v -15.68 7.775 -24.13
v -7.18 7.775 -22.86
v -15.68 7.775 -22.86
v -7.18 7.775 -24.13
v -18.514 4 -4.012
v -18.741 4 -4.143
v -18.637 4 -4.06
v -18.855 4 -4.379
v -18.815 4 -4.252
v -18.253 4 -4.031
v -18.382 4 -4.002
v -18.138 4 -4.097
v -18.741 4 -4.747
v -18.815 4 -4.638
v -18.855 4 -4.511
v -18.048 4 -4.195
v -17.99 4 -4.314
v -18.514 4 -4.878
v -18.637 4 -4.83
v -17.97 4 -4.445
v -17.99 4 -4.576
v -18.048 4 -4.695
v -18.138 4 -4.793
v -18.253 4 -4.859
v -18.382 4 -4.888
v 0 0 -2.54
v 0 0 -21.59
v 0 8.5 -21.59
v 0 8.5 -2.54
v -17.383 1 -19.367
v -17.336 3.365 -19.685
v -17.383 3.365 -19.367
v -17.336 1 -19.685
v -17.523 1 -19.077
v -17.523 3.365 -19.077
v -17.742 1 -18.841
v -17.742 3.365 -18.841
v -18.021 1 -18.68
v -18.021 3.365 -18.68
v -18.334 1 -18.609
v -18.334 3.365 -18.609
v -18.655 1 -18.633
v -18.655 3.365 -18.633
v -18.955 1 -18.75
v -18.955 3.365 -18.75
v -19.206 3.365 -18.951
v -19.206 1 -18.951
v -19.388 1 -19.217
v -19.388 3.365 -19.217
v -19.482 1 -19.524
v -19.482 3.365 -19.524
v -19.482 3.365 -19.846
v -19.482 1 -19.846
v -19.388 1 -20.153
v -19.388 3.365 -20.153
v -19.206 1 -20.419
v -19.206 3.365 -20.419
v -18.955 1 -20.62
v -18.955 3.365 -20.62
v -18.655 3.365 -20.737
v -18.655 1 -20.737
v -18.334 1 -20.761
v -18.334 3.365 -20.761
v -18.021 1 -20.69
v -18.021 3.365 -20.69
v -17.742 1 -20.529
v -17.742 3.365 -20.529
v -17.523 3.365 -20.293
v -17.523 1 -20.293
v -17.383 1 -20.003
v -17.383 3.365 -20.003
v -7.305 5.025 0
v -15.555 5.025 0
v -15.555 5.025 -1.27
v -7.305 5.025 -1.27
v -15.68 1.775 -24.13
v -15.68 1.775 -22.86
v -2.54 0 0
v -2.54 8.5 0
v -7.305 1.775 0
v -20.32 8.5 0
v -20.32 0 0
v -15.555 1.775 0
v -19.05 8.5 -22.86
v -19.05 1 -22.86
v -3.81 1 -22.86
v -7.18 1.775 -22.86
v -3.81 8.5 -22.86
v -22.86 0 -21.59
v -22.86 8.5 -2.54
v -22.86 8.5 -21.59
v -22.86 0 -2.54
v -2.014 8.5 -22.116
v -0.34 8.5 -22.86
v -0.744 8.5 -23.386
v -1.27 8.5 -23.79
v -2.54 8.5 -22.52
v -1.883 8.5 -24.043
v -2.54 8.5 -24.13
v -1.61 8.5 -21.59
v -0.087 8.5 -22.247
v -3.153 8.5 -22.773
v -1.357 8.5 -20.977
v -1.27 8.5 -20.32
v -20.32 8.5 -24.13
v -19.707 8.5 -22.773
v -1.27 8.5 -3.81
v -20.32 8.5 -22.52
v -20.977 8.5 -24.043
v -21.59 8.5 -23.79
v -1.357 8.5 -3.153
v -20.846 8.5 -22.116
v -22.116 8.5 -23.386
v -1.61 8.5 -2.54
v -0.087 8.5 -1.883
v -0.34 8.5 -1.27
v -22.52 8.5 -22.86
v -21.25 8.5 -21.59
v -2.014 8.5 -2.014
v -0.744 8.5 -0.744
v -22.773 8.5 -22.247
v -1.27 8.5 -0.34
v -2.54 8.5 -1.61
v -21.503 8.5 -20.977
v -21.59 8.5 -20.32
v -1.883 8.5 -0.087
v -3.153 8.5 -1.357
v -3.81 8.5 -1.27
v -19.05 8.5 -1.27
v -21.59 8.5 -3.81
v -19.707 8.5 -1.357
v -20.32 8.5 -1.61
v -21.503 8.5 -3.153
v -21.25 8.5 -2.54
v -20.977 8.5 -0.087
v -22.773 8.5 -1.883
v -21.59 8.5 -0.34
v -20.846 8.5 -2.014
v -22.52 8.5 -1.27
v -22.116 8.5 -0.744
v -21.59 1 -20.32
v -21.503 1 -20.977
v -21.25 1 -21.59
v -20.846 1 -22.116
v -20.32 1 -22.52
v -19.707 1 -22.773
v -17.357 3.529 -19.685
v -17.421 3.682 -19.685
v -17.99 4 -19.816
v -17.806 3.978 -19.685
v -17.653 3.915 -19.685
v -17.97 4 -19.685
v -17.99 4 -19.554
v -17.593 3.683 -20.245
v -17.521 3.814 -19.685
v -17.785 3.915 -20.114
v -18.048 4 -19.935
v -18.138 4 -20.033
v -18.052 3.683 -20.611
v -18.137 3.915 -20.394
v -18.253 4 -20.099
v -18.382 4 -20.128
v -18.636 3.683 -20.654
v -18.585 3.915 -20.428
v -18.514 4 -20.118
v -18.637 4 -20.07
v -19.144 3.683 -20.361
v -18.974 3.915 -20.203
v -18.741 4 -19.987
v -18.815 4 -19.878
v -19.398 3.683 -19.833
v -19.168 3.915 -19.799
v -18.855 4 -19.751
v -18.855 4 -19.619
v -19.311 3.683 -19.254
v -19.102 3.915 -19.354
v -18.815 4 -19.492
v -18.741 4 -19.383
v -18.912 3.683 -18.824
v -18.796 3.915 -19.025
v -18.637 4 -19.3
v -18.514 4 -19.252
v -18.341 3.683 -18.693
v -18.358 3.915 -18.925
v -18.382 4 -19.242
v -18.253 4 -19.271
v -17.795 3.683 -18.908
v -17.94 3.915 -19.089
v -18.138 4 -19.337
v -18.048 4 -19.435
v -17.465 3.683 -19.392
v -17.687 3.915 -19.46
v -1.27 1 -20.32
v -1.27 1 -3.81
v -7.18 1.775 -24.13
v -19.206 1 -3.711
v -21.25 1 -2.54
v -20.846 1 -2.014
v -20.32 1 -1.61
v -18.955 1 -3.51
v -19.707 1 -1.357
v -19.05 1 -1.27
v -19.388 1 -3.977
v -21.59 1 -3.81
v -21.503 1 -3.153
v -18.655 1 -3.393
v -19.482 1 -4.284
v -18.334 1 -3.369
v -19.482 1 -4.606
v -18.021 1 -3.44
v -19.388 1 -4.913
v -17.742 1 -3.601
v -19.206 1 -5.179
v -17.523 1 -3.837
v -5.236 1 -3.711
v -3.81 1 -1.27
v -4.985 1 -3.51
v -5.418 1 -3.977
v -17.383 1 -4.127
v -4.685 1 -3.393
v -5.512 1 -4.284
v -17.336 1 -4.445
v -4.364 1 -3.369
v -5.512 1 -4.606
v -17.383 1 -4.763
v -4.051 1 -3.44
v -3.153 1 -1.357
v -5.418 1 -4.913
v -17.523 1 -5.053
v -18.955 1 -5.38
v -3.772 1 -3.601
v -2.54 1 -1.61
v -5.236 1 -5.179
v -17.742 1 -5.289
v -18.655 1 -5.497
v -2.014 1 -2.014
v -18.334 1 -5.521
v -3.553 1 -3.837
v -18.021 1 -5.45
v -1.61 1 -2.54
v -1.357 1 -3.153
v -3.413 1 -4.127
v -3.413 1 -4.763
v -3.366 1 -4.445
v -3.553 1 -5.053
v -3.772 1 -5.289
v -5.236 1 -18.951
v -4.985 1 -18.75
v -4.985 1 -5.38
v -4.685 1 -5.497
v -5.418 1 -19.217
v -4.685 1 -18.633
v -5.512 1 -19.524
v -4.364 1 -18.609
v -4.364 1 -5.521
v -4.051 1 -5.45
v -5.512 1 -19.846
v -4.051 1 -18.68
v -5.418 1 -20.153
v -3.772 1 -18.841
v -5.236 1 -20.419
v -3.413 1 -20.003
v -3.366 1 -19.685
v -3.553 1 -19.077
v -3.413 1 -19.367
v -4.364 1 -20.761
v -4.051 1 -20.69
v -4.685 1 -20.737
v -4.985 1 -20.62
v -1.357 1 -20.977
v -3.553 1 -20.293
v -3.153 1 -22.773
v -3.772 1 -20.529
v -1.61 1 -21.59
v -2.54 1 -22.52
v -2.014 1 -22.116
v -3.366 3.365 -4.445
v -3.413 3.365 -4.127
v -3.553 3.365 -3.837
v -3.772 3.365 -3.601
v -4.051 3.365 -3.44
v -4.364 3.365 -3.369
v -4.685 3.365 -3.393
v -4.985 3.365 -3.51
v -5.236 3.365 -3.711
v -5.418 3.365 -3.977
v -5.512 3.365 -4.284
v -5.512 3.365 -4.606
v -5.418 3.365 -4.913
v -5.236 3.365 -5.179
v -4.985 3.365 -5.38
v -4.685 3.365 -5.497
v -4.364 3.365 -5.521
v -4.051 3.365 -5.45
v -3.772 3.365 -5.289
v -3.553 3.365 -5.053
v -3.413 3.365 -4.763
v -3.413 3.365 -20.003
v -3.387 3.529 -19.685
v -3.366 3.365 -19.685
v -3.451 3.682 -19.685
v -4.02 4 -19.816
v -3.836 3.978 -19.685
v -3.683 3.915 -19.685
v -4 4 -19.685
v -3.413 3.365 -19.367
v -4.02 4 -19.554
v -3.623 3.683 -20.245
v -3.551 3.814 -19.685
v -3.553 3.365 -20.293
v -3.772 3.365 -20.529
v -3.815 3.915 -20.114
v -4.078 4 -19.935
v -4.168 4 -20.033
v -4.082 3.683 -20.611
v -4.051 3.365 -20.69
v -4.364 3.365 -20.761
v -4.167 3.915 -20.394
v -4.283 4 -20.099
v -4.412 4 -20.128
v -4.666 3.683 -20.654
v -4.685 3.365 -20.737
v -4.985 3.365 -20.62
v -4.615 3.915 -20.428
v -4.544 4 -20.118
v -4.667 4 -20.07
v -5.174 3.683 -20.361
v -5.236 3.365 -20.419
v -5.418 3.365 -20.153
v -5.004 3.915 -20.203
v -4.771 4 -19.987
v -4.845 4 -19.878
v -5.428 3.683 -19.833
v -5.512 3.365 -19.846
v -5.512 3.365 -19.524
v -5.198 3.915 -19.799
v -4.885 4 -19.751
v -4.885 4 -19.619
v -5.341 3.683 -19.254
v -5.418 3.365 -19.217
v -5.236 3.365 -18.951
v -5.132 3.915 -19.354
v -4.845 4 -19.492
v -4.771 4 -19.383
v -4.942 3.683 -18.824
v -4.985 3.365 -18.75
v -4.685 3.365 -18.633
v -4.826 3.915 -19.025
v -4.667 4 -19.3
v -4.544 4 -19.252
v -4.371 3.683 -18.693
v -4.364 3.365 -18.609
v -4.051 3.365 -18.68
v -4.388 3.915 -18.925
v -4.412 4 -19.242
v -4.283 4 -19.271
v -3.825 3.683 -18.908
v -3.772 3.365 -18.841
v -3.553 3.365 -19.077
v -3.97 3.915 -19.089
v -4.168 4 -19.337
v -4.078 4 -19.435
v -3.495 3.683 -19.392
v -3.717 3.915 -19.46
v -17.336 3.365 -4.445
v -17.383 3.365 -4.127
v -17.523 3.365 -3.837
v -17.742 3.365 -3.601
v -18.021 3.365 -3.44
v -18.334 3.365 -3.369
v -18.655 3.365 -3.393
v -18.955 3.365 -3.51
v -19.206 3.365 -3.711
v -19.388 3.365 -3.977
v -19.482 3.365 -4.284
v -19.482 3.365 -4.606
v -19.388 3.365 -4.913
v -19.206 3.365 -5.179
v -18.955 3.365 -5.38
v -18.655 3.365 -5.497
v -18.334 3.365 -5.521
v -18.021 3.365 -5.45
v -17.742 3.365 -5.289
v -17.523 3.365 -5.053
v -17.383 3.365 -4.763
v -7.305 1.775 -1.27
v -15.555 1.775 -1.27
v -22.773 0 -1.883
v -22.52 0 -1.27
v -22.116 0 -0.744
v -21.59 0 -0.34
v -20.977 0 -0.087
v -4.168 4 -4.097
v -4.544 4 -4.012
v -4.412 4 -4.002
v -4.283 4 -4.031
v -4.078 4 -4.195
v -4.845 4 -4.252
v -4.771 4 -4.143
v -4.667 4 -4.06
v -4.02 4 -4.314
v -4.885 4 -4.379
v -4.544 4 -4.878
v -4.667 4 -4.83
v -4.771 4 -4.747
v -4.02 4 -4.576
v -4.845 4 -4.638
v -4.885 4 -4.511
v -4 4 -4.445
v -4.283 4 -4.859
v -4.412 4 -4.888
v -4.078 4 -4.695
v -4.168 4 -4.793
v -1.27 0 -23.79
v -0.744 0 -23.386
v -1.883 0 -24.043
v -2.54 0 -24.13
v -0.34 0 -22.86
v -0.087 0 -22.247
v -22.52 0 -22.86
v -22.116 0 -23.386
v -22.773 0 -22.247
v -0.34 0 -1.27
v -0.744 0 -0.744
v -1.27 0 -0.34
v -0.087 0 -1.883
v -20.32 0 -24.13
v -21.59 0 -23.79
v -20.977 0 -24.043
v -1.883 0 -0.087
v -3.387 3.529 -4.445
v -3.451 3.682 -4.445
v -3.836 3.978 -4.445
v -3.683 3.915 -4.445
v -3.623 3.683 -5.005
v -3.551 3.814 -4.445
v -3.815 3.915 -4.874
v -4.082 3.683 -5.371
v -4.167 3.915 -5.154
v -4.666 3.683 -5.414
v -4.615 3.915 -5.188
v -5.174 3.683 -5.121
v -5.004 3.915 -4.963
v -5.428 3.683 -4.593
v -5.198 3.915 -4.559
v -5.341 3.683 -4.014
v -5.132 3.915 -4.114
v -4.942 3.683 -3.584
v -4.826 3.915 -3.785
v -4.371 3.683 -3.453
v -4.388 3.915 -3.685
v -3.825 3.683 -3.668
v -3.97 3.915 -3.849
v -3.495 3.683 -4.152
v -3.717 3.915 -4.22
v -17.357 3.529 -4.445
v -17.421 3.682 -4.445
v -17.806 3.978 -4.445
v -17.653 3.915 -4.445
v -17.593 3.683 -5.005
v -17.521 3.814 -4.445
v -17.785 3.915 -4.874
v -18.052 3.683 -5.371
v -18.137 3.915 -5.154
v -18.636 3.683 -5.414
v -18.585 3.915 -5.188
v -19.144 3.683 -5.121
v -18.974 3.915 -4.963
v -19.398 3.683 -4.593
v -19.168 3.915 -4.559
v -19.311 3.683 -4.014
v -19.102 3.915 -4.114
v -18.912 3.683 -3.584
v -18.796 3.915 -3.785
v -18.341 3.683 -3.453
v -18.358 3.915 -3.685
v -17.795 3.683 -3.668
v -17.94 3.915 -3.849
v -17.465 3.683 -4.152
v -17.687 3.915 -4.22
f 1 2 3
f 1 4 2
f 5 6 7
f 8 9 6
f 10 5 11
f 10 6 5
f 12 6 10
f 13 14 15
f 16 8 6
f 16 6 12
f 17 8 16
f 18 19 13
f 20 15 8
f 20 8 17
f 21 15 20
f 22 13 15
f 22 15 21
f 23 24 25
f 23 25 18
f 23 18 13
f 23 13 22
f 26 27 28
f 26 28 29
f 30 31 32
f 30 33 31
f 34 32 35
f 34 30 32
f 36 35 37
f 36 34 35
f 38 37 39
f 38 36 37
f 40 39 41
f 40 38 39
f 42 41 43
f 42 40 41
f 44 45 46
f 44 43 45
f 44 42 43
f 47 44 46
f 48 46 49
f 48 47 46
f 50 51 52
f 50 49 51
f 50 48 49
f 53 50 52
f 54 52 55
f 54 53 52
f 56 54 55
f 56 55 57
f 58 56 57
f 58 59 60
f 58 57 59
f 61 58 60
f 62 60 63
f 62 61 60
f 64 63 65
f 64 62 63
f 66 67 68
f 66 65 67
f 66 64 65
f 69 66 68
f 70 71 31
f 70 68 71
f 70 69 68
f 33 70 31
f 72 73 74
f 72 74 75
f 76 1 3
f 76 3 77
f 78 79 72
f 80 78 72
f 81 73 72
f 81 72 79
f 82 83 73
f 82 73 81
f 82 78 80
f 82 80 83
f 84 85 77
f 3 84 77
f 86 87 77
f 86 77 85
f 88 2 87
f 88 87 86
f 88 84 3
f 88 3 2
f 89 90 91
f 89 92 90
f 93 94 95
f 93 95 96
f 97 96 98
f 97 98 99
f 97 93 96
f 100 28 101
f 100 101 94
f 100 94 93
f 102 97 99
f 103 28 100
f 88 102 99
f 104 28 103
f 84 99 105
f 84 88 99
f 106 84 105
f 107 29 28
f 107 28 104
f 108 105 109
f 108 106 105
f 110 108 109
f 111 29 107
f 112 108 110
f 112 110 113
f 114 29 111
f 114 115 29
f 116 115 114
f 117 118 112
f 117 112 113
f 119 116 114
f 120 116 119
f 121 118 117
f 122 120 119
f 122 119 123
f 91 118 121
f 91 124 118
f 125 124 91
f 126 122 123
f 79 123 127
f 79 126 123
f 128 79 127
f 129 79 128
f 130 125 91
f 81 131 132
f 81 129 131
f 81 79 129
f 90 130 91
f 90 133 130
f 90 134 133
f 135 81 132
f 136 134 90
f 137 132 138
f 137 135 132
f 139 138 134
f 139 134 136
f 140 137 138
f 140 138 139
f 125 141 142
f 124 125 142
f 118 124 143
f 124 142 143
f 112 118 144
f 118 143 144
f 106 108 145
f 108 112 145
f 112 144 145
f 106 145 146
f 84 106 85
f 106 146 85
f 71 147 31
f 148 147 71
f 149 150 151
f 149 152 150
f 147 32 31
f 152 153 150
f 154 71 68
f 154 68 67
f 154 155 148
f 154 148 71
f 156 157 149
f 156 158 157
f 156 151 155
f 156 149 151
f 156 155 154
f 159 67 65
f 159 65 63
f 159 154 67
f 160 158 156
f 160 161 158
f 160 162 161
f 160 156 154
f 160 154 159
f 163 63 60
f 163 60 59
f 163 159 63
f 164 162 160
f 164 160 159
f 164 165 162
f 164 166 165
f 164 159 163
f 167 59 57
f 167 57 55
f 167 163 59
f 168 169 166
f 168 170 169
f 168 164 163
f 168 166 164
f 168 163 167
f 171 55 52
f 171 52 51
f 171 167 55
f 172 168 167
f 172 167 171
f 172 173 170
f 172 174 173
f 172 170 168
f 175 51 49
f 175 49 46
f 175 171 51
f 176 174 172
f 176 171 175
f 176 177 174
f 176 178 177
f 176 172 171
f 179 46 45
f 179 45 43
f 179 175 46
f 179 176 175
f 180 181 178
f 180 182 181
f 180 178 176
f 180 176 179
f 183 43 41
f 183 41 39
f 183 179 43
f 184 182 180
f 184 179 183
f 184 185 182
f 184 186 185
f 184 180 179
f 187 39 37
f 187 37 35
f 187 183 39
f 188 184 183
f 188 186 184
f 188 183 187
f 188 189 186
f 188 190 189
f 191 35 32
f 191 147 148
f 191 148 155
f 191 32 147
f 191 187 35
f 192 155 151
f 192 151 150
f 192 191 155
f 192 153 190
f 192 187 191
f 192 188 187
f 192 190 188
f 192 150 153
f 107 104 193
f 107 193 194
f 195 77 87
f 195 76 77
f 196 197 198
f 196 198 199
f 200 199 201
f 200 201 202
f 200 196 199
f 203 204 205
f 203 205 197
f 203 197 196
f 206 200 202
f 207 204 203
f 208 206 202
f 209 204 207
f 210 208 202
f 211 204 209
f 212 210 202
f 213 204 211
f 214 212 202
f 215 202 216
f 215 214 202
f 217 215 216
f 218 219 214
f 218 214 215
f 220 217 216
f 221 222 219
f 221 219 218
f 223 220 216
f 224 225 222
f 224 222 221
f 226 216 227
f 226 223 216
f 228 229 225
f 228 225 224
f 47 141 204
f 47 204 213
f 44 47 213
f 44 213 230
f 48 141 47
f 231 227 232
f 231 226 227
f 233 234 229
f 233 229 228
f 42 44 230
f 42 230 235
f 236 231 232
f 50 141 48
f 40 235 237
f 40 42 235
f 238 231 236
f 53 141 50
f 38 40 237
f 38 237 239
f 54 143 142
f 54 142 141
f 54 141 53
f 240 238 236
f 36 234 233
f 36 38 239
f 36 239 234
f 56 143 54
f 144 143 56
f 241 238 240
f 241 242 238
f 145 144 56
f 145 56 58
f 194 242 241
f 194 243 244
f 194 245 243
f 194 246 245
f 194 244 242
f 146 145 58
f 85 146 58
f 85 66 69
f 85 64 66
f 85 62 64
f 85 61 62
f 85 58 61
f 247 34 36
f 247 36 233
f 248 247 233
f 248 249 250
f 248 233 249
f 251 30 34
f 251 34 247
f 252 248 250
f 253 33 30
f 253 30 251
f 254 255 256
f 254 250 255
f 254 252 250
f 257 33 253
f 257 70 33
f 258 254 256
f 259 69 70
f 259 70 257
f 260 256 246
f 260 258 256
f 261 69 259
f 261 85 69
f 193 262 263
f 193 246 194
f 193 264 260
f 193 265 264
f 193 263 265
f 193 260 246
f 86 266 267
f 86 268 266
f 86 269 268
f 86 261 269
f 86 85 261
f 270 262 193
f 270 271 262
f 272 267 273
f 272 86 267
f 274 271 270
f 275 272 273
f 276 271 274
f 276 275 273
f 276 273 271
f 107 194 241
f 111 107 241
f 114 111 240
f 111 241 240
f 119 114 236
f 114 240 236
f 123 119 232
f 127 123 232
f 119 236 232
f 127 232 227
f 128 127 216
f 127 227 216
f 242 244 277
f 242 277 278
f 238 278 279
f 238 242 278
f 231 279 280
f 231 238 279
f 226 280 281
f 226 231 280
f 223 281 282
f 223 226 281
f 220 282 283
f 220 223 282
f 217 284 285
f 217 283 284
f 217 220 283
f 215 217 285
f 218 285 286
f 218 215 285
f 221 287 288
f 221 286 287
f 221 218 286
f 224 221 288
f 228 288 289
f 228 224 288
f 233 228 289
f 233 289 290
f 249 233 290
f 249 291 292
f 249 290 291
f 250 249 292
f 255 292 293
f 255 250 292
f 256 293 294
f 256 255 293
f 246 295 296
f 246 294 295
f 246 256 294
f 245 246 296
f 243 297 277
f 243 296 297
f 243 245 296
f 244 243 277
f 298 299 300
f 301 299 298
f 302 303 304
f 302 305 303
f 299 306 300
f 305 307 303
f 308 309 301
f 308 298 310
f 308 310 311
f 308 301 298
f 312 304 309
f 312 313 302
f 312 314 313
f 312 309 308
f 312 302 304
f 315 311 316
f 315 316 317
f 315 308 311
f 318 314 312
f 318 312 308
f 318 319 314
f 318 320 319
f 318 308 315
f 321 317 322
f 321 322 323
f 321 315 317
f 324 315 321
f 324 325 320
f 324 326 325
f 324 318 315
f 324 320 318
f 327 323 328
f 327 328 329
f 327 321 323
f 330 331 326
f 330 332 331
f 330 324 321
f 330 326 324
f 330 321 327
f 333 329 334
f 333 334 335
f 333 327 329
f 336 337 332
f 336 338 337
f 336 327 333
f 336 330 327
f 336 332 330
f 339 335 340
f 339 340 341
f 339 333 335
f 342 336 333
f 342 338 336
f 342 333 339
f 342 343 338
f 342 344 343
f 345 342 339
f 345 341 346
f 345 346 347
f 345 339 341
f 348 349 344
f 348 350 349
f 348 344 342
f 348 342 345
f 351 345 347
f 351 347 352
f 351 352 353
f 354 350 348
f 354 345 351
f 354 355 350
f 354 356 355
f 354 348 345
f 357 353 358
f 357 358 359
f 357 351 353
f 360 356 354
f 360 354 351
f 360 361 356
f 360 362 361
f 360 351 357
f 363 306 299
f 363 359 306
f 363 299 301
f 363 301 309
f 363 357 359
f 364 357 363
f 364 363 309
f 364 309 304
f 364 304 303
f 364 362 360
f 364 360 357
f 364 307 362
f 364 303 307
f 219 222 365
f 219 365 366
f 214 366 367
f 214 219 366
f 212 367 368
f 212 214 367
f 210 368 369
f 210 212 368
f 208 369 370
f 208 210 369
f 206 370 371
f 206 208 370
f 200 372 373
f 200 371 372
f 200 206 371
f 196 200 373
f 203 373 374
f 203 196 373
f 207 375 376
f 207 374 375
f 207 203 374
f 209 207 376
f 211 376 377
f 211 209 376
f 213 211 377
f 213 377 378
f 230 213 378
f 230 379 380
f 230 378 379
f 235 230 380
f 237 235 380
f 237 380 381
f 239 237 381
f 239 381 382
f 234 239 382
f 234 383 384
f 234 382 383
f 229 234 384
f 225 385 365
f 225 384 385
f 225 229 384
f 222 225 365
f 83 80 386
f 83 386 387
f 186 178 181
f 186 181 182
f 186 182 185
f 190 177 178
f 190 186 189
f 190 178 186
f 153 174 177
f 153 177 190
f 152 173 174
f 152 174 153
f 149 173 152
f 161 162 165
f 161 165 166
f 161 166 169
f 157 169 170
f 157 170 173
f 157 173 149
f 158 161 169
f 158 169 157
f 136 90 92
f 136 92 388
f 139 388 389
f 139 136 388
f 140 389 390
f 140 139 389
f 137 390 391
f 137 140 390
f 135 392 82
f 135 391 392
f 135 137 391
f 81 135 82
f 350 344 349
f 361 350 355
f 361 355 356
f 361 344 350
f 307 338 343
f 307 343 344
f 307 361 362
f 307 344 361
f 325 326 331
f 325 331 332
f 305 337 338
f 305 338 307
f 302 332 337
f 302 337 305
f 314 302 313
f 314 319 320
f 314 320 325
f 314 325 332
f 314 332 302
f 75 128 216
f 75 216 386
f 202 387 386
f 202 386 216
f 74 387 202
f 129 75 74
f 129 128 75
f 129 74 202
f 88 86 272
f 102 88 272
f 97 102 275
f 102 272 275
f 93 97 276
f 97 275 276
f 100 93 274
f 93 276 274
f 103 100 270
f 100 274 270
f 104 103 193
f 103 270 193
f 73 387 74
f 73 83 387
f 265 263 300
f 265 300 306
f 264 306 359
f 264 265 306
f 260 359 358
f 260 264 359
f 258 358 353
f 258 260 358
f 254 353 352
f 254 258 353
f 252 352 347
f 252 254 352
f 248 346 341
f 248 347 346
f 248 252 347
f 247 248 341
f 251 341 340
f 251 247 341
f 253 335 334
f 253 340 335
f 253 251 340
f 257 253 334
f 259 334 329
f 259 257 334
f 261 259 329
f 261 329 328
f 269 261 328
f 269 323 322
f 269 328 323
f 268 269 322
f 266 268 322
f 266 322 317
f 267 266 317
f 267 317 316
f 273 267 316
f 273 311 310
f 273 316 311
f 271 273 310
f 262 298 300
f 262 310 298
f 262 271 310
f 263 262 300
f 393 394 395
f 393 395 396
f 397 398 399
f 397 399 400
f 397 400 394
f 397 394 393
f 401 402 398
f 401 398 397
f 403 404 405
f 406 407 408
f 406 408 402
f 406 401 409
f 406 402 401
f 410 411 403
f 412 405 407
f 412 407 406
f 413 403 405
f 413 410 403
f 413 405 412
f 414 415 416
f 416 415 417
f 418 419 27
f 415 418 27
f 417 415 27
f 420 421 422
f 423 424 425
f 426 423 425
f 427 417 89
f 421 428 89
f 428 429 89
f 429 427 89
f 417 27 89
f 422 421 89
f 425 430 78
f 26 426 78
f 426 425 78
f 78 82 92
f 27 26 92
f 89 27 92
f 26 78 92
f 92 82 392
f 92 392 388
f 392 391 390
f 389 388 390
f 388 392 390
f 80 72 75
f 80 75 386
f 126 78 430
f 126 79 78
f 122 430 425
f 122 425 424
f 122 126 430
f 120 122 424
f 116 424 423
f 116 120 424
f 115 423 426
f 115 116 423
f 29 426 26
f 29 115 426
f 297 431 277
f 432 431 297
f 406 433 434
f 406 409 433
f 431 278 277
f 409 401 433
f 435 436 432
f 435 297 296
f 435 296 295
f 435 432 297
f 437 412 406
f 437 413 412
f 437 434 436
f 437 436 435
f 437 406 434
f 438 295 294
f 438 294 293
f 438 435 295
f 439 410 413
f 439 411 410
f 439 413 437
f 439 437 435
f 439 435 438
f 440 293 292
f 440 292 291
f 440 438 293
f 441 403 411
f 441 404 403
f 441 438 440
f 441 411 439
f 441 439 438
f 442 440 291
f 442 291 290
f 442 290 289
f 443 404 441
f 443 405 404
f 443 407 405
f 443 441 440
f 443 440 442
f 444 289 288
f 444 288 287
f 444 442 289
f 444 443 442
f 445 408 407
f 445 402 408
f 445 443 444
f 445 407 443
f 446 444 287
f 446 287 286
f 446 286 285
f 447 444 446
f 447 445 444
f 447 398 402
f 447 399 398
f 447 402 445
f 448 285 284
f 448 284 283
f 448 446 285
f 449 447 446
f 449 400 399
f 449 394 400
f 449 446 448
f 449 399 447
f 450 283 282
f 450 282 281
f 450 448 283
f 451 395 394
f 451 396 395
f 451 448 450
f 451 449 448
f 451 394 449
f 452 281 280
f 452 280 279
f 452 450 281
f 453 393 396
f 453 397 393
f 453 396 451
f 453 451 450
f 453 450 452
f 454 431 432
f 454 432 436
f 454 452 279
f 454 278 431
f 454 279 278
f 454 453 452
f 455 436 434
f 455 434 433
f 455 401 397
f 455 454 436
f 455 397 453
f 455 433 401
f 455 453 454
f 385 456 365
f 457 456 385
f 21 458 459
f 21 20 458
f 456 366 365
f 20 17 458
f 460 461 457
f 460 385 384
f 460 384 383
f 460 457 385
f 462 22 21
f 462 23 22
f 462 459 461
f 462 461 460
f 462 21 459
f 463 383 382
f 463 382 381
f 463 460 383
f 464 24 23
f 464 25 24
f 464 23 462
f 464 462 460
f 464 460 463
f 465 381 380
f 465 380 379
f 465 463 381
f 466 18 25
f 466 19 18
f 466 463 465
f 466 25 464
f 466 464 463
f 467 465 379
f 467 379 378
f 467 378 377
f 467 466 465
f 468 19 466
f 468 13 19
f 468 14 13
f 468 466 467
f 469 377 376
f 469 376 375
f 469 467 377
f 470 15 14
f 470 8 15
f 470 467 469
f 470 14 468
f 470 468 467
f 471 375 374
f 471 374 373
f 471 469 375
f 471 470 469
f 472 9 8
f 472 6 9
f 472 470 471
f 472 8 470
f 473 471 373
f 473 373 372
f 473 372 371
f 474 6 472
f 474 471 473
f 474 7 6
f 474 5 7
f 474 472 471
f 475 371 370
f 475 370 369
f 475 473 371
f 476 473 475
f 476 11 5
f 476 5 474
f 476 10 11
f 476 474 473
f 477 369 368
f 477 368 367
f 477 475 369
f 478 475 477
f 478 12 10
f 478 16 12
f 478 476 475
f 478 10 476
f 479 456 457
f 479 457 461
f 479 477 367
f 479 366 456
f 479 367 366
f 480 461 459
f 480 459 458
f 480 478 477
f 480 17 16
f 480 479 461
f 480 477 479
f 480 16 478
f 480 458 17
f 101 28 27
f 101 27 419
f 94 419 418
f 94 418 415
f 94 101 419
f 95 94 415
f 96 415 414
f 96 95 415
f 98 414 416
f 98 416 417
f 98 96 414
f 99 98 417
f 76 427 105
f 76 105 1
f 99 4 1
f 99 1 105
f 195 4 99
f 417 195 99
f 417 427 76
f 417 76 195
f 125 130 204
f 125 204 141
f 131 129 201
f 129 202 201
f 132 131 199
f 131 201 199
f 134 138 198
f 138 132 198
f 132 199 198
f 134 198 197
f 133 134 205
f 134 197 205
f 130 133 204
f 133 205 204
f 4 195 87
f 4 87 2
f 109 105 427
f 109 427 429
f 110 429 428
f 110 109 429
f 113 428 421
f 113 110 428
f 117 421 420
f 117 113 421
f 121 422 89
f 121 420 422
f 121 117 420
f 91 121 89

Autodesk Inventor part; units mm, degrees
ref_plane "YZ Plane" through (0, 0, 0) normal (1, 0, 0) x (0, 1, 0)
ref_plane "XZ Plane" through (0, 0, 0) normal (0, 1, 0) x (-1, 0, 0)
ref_plane "XY Plane" through (0, 0, 0) normal (0, 0, 1) x (1, 0, 0)
sketch "Sketch1" plane through (0, 0, 0) normal (0, 1, 0) x (-1, 0, 0)
  line L0 (0, 0) -> (22.86, 0)
  line L1 (22.86, 0) -> (22.86, -24.13)
  line L2 (22.86, -24.13) -> (0, -24.13)
  line L3 (0, -24.13) -> (0, 0)
  dimension "d0" = 24.13
  dimension "d1" = 22.86
extrude "Extrusion1" add sketch "Sketch1" along normal blind 8.5
sketch "Sketch2" plane through (0, 8.5, 0) normal (0, 1, 0) x (1, 0, 0)
  line L0 (-1.27, 1.27) -> (-21.59, 1.27)
  line L1 (-21.59, 1.27) -> (-21.59, 22.86)
  line L2 (-21.59, 22.86) -> (-1.27, 22.86)
  line L3 (-1.27, 22.86) -> (-1.27, 1.27)
  line L4 (-22.86, 0) -> (0, 0) projected
  line L5 (0, 24.13) -> (-22.86, 24.13) projected
  line L6 (0, 0) -> (0, 24.13) projected
  line L7 (-22.86, 24.13) -> (-22.86, 0) projected
  dimension "d4" = 21.59
  dimension "d5" = 20.32
  dimension "d6" = 1.27
  dimension "d7" = 1.27
  dimension "d8" = 1.27
  dimension "d9" = 1.27
extrude "Extrusion2" cut sketch "Sketch2" against normal blind 7.5 contours L0 L1 L2 L3
fillet "Fillet1" radius 2.54 4 edges at (-21.59, 4.75, -1.27) (-21.59, 4.75, -22.86) (-1.27, 4.75, -22.86) (-1.27, 4.75, -1.27)
sketch "Sketch3" plane through (0, 1, 0) normal (0, 1, 0) x (1, 0, 0)
  line L0 (-3.81, 1.27) -> (-19.05, 1.27) projected
  line L1 (-19.05, 22.86) -> (-3.81, 22.86) projected
  line L2 (-1.27, 20.32) -> (-1.27, 3.81) projected
  line L3 (-21.59, 3.81) -> (-21.59, 20.32) projected
  circle A0 centre (-18.415, 4.445) radius 1.0795
  circle A1 centre (-18.415, 19.685) radius 1.0795
  circle A2 centre (-4.445, 19.685) radius 1.0795
  circle A3 centre (-4.445, 4.445) radius 1.0795
  point P0 (0, 0)
  dimension "d13" = 13.97
  dimension "d14" = 15.24
  dimension "d15" = 13.97
  dimension "d16" = 15.24
  dimension "d17" = 3.175
  dimension "d19" = 3.175
  dimension "d20" = 3.175
  dimension "d21" = 3.175
  dimension "d22" = 3.175
  dimension "d23" = 3.175
  dimension "d24" = 2.159
extrude "Extrusion3" add sketch "Sketch3" along normal blind 3
fillet "Fillet2" radius 0.635 4 edges at (-19.4945, 4, -19.685) (-5.5245, 4, -19.685) (-19.4945, 4, -4.445) (-5.5245, 4, -4.445)
sketch "Sketch4" plane through (-22.86, 0, 0) normal (0, 0, 1) x (1, 0, 0)
  line L0 (7.305, 5.025) -> (15.555, 5.025)
  line L1 (15.555, 5.025) -> (15.555, 1.775)
  line L2 (15.555, 1.775) -> (7.305, 1.775)
  line L3 (7.305, 1.775) -> (7.305, 5.025)
  line L4 (0, 0) -> (0, 8.5) projected
  line L5 (22.86, 0) -> (22.86, 8.5) projected
  line L6 (19.05, 1) -> (3.81, 1) projected
  dimension "d28" = 8.25
  dimension "d29" = 3.25
  dimension "d30" = 7.305
  dimension "d31" = 7.305
  dimension "d32" = 0.775
extrude "Extrusion4" cut sketch "Sketch4" against normal up to surface (1.27 mm away)
sketch "Sketch5" plane through (0, 0, -24.13) normal (0, 0, -1) x (-1, 0, 0)
  line L0 (7.18, 7.775) -> (15.68, 7.775)
  line L1 (15.68, 7.775) -> (15.68, 1.775)
  line L2 (15.68, 1.775) -> (7.18, 1.775)
  line L3 (7.18, 1.775) -> (7.18, 7.775)
  line L4 (0, 0) -> (0, 8.5) projected
  line L5 (22.86, 0) -> (22.86, 8.5) projected
  line L6 (0, 0) -> (22.86, 0) projected
  line L7 (19.05, 1) -> (3.81, 1) projected
  dimension "d35" = 8.5
  dimension "d36" = 6
  dimension "d37" = 7.18
  dimension "d38" = 7.18
  dimension "d43" = 0.775
extrude "Extrusion5" cut sketch "Sketch5" against normal up to surface (1.27 mm away)
fillet "Fillet3" radius 2.54 4 edges at (0, 4.25, 0) (-22.86, 4.25, 0) (0, 4.25, -24.13) (-22.86, 4.25, -24.13)
equation "\"d6\" = d7"
equation "\"d8\" = d9"
equation "\"d16\" = d14"
equation "\"d22\" = d23"
equation "\"d30\" = d31"
equation "\"d37\" = d38"
properties part number "micro lipo case"
